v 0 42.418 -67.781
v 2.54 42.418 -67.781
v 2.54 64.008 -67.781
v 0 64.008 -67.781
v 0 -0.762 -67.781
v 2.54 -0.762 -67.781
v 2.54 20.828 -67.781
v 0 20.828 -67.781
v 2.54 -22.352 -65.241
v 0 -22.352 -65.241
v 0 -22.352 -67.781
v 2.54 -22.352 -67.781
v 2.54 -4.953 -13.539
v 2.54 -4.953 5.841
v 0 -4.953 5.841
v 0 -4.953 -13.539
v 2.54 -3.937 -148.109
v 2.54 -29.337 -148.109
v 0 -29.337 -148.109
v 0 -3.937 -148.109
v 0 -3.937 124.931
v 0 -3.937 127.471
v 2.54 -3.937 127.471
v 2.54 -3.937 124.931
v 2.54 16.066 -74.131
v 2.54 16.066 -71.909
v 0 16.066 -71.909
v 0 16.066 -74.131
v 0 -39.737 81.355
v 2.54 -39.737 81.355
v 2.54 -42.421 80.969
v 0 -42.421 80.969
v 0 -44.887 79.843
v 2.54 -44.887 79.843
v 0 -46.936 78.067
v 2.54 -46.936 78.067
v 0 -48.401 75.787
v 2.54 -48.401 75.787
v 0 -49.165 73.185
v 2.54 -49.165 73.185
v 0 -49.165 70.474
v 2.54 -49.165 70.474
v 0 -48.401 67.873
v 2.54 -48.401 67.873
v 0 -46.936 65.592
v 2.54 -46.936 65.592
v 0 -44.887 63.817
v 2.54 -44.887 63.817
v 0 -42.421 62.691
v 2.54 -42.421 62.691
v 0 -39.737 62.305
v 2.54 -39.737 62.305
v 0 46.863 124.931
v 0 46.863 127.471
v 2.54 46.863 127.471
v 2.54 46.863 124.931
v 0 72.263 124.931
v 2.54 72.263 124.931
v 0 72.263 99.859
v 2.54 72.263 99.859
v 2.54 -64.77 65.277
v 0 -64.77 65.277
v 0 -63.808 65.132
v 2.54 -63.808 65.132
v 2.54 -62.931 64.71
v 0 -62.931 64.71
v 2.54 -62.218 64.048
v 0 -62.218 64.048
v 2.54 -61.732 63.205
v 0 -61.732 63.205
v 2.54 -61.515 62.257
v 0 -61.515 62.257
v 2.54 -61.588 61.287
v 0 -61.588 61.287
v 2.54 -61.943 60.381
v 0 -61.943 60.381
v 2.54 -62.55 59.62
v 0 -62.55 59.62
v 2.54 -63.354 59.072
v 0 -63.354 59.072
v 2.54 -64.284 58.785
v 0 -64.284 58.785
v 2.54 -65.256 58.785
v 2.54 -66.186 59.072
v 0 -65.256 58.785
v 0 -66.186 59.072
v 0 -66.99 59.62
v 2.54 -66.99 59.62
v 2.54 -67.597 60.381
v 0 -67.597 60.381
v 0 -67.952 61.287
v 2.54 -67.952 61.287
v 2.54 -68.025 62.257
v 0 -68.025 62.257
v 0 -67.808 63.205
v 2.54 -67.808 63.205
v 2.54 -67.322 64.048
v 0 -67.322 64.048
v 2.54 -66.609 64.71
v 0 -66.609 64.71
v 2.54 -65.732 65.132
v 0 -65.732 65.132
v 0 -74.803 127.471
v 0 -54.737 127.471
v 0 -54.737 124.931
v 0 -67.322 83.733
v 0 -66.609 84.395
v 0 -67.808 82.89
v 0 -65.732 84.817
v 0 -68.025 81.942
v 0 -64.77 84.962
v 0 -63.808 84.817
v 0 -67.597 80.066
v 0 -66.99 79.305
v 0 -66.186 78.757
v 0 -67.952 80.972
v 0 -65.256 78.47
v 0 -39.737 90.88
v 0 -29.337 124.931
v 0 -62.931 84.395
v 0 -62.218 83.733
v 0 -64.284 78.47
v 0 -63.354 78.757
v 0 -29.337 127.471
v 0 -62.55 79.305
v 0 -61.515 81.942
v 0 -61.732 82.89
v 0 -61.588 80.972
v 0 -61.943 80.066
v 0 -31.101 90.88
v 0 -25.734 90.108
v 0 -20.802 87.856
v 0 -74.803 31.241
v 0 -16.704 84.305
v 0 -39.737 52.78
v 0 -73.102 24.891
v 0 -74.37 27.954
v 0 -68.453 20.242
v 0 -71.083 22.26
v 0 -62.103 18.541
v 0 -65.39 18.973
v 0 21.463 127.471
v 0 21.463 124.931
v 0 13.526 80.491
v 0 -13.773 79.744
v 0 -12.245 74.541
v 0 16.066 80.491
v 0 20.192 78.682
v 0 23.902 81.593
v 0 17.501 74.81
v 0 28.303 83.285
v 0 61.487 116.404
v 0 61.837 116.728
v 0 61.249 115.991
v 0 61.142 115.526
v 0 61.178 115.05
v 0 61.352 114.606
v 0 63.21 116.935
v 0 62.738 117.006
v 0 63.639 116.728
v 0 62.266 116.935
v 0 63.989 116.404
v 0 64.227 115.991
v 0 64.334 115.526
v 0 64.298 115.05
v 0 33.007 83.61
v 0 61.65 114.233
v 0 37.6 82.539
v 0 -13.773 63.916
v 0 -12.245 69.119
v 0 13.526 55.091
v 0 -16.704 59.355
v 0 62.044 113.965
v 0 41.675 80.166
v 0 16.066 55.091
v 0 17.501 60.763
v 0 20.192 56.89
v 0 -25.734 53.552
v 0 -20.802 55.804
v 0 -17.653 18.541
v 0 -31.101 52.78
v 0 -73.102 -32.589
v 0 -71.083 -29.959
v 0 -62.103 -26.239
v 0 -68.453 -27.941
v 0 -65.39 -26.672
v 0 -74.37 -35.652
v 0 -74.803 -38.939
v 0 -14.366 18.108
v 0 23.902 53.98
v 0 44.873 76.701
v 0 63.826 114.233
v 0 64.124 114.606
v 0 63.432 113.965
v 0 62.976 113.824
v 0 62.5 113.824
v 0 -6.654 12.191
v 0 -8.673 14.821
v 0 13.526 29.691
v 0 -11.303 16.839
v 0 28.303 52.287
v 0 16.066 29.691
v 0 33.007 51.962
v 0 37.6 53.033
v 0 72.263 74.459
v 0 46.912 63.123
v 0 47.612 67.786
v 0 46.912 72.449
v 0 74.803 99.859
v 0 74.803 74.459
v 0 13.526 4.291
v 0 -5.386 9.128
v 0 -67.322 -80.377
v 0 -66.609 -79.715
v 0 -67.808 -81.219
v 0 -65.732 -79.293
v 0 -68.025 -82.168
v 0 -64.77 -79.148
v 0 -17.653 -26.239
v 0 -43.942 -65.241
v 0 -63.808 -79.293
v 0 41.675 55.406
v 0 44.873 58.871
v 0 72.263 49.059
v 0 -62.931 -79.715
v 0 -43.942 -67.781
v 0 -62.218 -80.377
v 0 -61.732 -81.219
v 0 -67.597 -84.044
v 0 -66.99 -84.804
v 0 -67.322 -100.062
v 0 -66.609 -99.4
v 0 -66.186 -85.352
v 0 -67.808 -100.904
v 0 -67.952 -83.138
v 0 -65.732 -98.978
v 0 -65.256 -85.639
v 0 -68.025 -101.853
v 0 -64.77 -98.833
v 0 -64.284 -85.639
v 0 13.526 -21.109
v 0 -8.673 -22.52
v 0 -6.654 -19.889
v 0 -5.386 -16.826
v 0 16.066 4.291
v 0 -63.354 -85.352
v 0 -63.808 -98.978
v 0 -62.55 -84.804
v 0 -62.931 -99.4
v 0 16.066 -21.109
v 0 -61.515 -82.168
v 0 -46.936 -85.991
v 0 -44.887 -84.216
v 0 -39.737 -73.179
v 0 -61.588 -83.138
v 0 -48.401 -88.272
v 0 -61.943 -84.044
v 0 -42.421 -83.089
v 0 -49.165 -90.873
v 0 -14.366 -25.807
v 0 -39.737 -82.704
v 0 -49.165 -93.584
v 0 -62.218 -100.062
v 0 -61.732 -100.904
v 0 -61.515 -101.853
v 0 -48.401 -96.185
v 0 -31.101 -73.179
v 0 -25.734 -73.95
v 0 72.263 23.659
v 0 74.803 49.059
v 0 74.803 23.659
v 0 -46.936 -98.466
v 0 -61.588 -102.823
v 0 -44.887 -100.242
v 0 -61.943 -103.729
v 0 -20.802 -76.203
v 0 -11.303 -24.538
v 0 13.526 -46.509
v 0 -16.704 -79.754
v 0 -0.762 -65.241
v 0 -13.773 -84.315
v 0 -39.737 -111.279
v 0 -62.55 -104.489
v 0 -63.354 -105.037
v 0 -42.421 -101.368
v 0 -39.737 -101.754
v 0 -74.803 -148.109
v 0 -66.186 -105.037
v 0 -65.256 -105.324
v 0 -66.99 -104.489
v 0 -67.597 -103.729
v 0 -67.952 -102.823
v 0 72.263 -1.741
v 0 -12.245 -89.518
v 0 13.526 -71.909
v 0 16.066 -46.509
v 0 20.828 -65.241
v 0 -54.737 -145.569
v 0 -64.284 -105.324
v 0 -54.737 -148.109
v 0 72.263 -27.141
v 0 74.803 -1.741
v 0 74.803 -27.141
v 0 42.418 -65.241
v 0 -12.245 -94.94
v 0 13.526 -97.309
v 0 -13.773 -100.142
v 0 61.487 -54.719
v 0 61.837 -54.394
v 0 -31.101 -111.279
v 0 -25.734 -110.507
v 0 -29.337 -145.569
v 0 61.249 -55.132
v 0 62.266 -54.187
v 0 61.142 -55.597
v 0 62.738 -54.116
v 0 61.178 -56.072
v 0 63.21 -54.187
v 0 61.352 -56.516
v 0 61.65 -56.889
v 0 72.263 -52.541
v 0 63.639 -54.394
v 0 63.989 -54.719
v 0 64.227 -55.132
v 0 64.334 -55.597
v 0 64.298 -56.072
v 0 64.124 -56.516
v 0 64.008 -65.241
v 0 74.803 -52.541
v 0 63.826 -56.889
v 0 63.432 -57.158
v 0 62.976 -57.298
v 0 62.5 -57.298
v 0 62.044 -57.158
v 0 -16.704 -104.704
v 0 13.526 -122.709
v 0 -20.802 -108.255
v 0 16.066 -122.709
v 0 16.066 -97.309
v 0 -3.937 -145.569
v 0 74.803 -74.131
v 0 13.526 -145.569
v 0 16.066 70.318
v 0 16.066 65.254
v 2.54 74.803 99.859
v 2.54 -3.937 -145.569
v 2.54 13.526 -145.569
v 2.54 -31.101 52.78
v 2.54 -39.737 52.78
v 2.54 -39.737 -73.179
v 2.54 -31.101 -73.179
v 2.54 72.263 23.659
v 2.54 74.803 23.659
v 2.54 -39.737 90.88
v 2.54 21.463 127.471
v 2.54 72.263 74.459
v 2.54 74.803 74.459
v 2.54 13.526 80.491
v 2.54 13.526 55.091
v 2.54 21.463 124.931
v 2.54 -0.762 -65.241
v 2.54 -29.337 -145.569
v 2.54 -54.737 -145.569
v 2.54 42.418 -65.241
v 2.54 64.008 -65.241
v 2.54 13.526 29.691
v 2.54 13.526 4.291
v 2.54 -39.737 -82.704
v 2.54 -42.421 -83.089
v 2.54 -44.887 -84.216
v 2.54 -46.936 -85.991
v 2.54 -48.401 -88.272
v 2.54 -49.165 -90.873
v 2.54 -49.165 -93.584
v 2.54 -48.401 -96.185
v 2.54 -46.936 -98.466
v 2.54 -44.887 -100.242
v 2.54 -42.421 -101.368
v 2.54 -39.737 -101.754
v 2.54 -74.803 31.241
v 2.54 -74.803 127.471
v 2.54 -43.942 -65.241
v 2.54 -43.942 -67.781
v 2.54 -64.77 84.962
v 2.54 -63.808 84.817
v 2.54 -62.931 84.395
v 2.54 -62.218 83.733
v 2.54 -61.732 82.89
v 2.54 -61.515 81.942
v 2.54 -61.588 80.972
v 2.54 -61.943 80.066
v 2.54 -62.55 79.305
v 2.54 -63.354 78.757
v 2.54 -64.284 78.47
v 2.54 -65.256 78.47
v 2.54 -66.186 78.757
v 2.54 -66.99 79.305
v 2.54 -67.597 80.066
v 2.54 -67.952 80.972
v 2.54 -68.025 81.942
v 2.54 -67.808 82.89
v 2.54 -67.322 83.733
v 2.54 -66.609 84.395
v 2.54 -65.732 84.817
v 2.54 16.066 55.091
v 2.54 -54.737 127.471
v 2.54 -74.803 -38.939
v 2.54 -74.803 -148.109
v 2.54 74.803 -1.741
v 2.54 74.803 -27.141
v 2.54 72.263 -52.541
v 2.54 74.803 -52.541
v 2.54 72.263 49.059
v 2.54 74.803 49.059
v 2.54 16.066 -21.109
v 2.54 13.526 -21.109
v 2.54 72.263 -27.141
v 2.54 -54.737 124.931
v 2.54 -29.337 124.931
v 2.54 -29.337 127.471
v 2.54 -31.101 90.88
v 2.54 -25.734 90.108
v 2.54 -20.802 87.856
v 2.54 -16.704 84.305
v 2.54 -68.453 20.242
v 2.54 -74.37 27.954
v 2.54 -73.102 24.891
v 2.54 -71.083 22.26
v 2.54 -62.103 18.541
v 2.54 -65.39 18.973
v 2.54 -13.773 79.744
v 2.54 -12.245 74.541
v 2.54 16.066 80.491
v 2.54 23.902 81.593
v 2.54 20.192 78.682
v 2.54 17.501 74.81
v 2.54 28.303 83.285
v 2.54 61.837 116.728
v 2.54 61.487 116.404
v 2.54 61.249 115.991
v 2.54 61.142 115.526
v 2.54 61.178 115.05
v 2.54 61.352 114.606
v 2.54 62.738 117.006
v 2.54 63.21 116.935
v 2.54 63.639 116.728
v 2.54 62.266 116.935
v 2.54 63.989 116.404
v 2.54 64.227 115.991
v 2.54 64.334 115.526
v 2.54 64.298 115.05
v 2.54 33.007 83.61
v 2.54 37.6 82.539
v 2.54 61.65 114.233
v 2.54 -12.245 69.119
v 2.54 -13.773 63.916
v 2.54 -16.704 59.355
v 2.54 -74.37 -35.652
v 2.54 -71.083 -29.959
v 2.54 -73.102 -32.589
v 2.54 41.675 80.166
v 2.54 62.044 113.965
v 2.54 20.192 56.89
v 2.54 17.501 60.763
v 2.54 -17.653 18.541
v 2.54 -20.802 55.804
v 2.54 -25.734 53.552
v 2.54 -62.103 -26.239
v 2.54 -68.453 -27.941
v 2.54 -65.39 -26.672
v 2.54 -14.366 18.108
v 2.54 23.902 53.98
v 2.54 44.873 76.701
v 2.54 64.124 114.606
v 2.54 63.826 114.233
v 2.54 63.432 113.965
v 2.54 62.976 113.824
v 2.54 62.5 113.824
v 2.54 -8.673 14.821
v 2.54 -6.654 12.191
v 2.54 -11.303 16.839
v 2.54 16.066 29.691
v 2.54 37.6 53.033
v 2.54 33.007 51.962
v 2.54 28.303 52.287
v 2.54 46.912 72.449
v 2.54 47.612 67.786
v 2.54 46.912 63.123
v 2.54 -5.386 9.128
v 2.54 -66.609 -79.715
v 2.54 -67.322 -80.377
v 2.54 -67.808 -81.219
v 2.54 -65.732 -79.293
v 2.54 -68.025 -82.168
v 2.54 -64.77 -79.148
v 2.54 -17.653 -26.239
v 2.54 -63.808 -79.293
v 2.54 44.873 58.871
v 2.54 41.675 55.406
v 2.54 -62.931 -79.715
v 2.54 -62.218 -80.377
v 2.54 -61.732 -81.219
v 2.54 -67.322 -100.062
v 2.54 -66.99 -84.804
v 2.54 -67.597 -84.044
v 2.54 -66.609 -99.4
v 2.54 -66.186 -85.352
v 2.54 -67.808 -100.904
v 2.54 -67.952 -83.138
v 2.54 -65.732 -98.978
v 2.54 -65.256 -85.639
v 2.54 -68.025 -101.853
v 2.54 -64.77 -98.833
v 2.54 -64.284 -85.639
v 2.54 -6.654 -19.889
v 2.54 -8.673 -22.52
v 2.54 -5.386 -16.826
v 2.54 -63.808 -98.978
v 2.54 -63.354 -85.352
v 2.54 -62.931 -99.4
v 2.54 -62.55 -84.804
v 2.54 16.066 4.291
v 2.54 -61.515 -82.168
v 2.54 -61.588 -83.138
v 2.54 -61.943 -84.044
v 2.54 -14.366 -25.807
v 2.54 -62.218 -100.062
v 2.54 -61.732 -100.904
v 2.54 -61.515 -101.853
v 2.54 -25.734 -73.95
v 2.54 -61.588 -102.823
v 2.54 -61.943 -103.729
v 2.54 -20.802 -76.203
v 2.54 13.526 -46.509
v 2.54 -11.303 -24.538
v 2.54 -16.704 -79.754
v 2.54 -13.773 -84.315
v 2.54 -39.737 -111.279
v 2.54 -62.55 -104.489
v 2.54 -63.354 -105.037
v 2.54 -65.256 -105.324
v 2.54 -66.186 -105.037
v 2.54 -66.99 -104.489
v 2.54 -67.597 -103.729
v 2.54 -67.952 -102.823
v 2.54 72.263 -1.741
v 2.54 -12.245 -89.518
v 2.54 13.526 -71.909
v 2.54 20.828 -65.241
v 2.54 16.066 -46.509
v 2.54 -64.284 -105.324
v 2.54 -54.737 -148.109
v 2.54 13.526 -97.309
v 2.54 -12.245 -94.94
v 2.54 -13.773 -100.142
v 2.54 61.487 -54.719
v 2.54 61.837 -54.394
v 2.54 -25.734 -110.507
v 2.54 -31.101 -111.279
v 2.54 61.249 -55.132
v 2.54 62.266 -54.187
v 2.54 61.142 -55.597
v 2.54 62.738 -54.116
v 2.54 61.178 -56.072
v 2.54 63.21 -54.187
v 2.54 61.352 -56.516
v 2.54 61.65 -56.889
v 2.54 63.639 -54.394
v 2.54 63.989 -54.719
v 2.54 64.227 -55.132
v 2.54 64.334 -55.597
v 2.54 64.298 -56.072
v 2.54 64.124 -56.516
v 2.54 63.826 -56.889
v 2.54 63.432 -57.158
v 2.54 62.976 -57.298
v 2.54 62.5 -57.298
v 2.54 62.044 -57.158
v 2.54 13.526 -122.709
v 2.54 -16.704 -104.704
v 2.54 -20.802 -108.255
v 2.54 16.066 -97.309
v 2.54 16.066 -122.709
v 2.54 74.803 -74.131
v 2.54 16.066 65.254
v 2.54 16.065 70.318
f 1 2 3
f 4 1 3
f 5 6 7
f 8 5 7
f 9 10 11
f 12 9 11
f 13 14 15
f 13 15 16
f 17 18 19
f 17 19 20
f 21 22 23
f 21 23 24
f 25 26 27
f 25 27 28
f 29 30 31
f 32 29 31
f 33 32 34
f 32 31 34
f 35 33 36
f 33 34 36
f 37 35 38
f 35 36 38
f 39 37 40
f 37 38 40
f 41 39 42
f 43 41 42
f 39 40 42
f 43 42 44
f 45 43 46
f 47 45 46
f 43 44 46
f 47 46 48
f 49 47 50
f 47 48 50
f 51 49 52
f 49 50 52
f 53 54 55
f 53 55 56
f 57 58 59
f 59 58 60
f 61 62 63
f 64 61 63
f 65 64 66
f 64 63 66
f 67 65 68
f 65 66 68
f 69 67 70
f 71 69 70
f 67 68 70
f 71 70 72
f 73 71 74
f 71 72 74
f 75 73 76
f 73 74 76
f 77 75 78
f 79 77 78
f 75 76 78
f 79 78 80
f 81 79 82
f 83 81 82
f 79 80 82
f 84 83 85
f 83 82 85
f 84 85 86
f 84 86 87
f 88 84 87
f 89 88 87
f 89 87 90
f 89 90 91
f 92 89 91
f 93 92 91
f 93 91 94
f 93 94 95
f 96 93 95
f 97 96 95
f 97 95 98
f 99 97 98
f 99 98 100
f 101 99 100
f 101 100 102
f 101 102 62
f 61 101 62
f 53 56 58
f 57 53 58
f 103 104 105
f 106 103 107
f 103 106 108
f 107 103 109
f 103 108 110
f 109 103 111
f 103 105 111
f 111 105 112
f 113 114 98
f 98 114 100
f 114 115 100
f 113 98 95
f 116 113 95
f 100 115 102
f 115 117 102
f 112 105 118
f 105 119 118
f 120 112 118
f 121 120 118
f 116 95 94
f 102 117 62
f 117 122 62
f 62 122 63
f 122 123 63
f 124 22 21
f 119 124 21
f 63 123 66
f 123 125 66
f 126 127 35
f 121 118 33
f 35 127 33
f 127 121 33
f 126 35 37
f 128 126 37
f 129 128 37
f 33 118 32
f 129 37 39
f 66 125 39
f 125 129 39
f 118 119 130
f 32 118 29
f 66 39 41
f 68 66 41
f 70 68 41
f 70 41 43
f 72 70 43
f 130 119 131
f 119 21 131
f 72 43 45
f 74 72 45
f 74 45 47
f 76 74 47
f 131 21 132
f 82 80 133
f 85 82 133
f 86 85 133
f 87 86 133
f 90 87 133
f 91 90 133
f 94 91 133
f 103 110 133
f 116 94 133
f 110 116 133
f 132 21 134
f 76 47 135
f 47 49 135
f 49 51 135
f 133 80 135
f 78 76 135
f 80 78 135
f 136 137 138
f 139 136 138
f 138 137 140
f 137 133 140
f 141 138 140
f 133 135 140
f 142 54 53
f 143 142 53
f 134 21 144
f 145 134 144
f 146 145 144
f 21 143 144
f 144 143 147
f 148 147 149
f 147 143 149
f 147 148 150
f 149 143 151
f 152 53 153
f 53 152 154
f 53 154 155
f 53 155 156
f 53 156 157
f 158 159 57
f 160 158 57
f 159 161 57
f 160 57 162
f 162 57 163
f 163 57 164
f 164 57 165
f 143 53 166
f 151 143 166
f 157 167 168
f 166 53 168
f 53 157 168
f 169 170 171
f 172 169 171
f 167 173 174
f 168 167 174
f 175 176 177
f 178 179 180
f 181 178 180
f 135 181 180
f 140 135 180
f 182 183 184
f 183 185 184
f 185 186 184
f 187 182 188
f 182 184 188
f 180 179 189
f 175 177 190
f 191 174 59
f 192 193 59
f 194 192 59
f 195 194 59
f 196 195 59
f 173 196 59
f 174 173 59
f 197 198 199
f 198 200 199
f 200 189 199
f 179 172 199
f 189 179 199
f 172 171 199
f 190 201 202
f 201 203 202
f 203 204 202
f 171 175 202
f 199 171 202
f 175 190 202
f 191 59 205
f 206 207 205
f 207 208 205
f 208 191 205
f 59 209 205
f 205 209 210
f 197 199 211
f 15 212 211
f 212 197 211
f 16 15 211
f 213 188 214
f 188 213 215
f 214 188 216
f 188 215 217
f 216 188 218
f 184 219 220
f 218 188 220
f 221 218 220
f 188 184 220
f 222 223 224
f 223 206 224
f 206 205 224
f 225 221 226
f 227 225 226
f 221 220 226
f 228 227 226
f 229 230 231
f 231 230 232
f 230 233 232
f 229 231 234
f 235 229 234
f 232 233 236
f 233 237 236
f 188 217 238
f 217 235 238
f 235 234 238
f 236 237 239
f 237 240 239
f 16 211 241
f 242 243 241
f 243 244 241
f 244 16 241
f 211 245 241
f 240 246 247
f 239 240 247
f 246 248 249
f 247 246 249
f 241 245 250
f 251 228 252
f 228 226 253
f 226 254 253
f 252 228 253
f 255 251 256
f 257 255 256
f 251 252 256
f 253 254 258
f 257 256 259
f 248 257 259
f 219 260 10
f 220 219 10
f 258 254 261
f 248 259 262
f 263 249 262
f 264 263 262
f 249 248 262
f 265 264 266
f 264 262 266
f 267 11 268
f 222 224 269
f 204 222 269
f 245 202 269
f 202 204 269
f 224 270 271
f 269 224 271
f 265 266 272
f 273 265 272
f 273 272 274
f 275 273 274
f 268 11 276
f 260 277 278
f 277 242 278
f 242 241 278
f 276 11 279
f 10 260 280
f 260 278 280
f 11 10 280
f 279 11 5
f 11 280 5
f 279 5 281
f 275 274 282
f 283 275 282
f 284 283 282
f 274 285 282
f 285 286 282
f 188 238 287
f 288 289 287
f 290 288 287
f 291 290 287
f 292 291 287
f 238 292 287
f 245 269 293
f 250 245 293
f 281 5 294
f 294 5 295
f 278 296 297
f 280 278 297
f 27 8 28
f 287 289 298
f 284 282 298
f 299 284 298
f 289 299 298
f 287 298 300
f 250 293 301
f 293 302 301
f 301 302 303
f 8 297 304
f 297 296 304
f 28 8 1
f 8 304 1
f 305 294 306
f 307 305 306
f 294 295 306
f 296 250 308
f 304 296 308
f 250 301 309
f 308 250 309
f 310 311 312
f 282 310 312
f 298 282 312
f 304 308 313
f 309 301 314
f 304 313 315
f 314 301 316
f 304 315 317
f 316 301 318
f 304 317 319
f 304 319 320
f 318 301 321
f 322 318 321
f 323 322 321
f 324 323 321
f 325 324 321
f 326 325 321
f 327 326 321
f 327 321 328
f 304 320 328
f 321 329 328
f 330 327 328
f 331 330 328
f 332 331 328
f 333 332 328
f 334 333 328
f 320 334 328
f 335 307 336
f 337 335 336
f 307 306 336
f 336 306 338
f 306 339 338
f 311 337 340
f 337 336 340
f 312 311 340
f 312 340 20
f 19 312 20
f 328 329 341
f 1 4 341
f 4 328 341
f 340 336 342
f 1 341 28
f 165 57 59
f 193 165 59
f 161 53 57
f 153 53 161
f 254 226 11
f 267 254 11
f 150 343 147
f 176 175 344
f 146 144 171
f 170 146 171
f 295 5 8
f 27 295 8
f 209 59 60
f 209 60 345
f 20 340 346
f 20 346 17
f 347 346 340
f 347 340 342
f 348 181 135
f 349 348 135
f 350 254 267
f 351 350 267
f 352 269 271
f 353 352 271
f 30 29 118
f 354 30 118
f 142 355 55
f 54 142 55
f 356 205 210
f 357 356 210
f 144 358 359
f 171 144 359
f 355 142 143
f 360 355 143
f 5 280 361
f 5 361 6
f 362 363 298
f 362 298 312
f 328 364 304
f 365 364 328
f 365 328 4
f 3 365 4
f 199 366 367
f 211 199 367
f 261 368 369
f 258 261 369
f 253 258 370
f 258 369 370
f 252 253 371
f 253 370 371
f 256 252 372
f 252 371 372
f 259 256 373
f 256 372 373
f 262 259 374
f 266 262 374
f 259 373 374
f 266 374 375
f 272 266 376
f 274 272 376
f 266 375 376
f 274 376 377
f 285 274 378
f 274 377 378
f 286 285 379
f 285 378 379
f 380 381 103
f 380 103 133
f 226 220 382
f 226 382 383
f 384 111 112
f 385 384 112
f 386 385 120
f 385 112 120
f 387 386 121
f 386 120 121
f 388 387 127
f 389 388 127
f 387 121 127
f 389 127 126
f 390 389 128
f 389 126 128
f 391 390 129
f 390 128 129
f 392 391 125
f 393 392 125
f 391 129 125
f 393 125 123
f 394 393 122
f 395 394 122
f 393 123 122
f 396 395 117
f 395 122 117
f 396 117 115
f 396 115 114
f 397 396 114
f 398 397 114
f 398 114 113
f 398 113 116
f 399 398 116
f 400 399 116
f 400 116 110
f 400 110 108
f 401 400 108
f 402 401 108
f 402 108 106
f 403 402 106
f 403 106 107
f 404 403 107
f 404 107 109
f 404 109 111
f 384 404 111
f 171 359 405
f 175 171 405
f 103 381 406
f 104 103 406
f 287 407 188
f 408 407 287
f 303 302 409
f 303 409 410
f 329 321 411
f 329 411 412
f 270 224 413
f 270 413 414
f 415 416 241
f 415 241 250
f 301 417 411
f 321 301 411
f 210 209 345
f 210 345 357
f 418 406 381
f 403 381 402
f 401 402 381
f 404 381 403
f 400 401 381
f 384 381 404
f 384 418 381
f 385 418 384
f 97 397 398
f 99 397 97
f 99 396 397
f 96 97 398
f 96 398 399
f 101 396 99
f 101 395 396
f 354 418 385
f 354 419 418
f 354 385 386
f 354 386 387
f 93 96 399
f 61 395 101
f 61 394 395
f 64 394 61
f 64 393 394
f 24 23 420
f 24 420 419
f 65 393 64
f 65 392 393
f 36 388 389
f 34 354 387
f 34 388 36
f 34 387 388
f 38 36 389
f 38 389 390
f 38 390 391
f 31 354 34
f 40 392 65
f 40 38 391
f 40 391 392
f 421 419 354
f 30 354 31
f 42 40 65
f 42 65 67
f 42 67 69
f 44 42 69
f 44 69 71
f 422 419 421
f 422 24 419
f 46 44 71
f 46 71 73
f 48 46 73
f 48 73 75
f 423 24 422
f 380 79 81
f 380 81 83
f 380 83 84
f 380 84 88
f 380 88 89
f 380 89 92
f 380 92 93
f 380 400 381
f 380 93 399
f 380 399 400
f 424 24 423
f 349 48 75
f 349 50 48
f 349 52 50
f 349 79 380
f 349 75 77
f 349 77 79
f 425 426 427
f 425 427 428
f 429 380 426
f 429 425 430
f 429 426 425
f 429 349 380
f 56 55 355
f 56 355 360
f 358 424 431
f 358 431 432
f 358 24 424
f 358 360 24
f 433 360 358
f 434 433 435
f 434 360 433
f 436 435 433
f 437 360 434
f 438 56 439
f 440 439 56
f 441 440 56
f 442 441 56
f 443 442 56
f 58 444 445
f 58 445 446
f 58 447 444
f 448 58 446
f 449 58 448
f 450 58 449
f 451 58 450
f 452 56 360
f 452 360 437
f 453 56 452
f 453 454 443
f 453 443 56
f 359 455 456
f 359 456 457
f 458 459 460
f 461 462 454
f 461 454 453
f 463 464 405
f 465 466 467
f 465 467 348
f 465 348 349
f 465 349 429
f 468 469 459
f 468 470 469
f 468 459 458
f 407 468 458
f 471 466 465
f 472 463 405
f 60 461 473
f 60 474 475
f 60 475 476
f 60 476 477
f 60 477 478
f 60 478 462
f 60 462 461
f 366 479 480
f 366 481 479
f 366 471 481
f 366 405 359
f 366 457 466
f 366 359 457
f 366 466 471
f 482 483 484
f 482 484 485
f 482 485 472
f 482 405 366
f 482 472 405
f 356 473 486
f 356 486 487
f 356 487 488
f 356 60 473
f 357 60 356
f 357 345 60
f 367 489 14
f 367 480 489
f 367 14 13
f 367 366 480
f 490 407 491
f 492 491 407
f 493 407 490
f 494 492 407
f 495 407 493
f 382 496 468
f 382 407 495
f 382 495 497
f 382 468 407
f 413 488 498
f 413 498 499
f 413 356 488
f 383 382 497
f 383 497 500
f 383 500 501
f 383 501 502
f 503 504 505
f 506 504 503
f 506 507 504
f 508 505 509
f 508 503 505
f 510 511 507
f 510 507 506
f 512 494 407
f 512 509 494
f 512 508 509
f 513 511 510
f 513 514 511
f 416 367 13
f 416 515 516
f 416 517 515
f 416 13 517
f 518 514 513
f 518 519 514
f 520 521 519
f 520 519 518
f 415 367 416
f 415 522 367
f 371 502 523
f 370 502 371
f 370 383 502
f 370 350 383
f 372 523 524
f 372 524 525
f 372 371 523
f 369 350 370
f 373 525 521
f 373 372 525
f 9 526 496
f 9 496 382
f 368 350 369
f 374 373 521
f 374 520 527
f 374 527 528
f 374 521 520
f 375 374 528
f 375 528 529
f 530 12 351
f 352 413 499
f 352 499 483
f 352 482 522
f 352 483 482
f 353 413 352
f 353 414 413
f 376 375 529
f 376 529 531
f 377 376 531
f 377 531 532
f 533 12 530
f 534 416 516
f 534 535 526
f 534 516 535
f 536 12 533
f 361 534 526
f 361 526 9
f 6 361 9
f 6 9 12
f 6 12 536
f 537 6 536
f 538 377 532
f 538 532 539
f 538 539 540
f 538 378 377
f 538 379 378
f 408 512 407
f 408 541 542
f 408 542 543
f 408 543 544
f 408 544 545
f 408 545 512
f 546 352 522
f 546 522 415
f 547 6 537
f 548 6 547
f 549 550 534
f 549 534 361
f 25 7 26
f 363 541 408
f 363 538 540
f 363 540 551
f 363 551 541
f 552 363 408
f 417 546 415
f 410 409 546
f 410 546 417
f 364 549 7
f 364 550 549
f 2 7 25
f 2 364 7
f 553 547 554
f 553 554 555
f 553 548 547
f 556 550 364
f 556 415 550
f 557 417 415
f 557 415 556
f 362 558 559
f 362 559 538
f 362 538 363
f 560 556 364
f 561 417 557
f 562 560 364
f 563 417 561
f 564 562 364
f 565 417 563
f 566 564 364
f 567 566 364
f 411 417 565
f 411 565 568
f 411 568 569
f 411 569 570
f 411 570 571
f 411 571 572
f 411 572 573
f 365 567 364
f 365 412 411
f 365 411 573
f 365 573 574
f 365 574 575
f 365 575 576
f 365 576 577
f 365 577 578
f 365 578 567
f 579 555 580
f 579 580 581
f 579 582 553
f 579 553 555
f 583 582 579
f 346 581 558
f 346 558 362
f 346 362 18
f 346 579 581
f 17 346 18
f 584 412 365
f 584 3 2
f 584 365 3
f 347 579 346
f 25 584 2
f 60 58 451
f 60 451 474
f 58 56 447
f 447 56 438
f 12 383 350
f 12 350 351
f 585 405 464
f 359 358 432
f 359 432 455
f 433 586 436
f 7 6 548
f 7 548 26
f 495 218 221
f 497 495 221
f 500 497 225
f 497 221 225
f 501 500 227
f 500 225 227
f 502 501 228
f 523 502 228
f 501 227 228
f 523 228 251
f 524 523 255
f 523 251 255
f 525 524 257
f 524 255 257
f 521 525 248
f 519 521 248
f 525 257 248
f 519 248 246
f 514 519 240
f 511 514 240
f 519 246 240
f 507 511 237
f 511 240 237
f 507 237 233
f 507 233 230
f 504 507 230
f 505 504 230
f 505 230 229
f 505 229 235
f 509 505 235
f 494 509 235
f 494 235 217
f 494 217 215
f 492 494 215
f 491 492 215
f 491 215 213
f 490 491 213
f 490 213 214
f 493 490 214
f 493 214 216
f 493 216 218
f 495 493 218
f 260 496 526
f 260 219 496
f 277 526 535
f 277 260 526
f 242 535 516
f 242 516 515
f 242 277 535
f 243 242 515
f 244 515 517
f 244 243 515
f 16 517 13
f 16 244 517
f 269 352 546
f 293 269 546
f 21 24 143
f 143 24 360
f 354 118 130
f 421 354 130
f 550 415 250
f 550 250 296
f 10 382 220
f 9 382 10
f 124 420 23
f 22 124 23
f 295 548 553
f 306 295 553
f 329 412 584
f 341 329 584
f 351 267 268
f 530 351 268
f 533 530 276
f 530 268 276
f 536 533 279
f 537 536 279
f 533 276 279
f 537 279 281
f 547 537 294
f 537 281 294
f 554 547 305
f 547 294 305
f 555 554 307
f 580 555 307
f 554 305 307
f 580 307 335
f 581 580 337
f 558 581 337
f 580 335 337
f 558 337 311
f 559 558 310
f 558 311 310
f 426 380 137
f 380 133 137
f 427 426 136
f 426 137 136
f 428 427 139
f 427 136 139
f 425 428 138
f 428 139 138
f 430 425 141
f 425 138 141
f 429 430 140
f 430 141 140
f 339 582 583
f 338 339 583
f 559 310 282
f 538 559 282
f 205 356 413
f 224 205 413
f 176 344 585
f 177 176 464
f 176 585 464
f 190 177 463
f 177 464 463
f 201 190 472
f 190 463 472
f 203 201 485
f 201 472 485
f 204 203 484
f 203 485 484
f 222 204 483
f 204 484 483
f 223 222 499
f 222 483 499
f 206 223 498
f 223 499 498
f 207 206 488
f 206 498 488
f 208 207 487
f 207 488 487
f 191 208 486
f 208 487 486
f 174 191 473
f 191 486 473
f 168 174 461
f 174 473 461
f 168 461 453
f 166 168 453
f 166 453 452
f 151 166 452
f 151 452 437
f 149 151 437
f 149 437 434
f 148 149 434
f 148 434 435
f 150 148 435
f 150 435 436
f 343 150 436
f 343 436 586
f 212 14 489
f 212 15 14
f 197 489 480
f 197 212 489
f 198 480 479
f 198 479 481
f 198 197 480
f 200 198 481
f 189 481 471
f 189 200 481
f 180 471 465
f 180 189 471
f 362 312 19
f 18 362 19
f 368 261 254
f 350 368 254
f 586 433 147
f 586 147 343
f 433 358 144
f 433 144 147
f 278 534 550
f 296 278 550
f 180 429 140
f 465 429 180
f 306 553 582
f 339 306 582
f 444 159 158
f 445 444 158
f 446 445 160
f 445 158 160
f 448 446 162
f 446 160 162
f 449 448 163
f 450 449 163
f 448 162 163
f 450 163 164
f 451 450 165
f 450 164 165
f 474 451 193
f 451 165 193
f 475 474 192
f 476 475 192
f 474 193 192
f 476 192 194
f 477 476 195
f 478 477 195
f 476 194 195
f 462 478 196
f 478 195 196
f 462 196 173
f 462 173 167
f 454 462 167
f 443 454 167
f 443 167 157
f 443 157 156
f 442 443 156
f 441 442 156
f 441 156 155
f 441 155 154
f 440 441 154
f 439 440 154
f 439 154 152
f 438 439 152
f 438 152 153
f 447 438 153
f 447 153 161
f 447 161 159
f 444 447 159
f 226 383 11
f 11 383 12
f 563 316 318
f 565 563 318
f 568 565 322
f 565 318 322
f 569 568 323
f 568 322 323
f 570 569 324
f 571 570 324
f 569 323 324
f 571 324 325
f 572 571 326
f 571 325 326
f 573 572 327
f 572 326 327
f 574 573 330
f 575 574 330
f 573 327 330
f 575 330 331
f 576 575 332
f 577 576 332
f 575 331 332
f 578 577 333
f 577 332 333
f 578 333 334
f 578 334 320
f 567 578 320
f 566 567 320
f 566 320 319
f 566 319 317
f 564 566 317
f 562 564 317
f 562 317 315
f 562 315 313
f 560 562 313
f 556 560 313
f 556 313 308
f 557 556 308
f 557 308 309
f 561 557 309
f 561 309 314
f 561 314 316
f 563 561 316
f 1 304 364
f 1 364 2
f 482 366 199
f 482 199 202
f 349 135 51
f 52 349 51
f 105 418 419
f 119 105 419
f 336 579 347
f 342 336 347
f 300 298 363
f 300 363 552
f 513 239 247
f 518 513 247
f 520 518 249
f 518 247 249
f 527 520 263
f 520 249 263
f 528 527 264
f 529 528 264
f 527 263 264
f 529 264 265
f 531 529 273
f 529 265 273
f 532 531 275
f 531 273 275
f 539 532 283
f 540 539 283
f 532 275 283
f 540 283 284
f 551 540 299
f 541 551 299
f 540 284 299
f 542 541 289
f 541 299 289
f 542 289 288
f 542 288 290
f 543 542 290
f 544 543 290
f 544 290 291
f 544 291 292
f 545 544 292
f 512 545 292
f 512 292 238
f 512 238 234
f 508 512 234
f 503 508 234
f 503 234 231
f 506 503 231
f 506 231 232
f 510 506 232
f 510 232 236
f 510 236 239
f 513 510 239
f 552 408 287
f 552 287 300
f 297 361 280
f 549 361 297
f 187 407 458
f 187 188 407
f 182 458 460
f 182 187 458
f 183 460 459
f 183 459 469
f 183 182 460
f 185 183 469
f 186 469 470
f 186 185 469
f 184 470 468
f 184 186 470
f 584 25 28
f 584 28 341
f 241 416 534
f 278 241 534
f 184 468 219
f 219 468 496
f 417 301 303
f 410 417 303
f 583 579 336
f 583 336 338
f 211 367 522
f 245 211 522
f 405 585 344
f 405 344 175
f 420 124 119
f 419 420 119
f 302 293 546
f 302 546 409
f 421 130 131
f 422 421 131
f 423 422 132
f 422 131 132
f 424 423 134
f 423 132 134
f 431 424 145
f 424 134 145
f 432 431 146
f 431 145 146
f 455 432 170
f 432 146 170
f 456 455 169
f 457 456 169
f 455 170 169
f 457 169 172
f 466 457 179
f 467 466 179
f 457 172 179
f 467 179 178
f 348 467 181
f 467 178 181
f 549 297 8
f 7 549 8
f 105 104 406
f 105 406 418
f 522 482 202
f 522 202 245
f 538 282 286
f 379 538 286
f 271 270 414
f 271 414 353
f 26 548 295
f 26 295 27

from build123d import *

# Parameters (mm, degrees)
SKETCH1_W                   = 224.46234
SKETCH1_H                   = 149.606
BOSS_EXTRUDE1_DEPTH         = 2.54
SKETCH2_W                   = 44.45
SKETCH2_H                   = 87.5411
CUT_EXTRUDE1_DEPTH          = 135.899132423
F_1_4_CLEARANCE_HOLE1_D     = 6.5278
F_1_4_CLEARANCE_HOLE1_DEPTH = 9.398
F_1_4_CLEARANCE_HOLE1_TIP   = 1.961148974
SKETCH6_W                   = 25.4
SKETCH6_H                   = 2.54
CUT_EXTRUDE2_DEPTH          = 135.899132423
LPATTERN1_COUNT             = 4
LPATTERN1_PITCH             = 50.8
SKETCH7_W                   = 2.54
SKETCH7_H                   = 21.59
CUT_EXTRUDE3_DEPTH          = 135.899132423
LPATTERN2_COUNT             = 3
LPATTERN2_PITCH             = 43.18
SKETCH8_R                   = 9.525
CUT_EXTRUDE4_DEPTH          = 135.899132423
SKETCH9_R                   = 15.875
SKETCH9_W                   = 44.7802
SKETCH9_H                   = 69.85
CUT_EXTRUDE5_DEPTH          = 135.899132423
FILLET2_R                   = 12.7
SKETCH25_W                  = 12.7
SKETCH25_H                  = 147.066
BOSS_EXTRUDE5_DEPTH         = 2.54
SKETCH16_W                  = 2.54
SKETCH16_H                  = 25.4
BOSS_EXTRUDE2_DEPTH         = 2.54
SKETCH23_W                  = 44.45
SKETCH23_H                  = 87.5411
BOSS_EXTRUDE3_DEPTH         = 2.54
SKETCH24_W                  = 33.3375
SKETCH24_H                  = 149.606
BOSS_EXTRUDE4_DEPTH         = 2.54
LPATTERN3_COUNT             = 3
LPATTERN3_PITCH             = 50.8
LPATTERN3_COUNT_DIR2        = 2
LPATTERN3_PITCH_DIR2        = 273.03984
SKETCH18_W                  = 275.57984
SKETCH18_H                  = 5.334
CUT_EXTRUDE7_DEPTH          = 169.417839014
M3_CLEARANCE_HOLE1_D        = 3.2
M3_CLEARANCE_HOLE1_DEPTH    = 9.398
M3_CLEARANCE_HOLE1_TIP      = 0.96137699
SKETCH27_W                  = 73.9775
SKETCH27_H                  = 58.7375
CUT_EXTRUDE9_DEPTH          = 2.54
CUT_EXTRUDE10_DEPTH         = 2.54
SKETCH29_W                  = 25.4
SKETCH29_H                  = 2.54
CUT_EXTRUDE11_DEPTH         = 166.946131435
LPATTERN4_COUNT             = 5
LPATTERN4_PITCH             = 50.8


with BuildPart() as part:
    # Sketch1 → Boss-Extrude1 (new body)
    with BuildSketch(Plane(origin=(0, 0, 0), x_dir=(0, 0, -1), z_dir=(1, 0, 0))):
        Rectangle(SKETCH1_W, SKETCH1_H)
    extrude(amount=BOSS_EXTRUDE1_DEPTH)

    # Sketch2 → Cut-Extrude1 (cut, through all)
    with BuildSketch(Plane(origin=(2.54, 0, 0), x_dir=(0, 0, -1), z_dir=(1, 0, 0))):
        with Locations((90.00617, 31.03245)):
            Rectangle(SKETCH2_W, SKETCH2_H)
    extrude(amount=-CUT_EXTRUDE1_DEPTH, mode=Mode.SUBTRACT)

    # 1/4 Clearance Hole1
    with Locations(Plane(origin=(2.54, 0, 0), x_dir=(0, 0, -1), z_dir=(1, 0, 0))):
        with Locations((-81.69783, -64.77), (-62.01283, -64.77), (102.09657, -64.77), (82.41157, -64.77)):
            Hole(F_1_4_CLEARANCE_HOLE1_D / 2, depth=F_1_4_CLEARANCE_HOLE1_DEPTH)
            with Locations((0, 0, -(F_1_4_CLEARANCE_HOLE1_DEPTH + F_1_4_CLEARANCE_HOLE1_TIP / 2))):  # 118° drill point
                Cone(0, F_1_4_CLEARANCE_HOLE1_D / 2, F_1_4_CLEARANCE_HOLE1_TIP, mode=Mode.SUBTRACT)

    # Sketch6 → Cut-Extrude2 (cut, through all)
    with BuildSketch(Plane(origin=(2.54, 0, 0), x_dir=(0, 0, -1), z_dir=(1, 0, 0))):
        with Locations((39.84117, 73.533)):
            Rectangle(SKETCH6_W, SKETCH6_H)
    cut_extrude2 = extrude(amount=-CUT_EXTRUDE2_DEPTH, mode=Mode.SUBTRACT)

    # LPattern1: Cut-Extrude2 ×4
    with Locations(*[(0, 0, i * LPATTERN1_PITCH) for i in range(1, LPATTERN1_COUNT)]):
        add(cut_extrude2, mode=Mode.SUBTRACT)

    # Sketch7 → Cut-Extrude3 (cut, through all)
    with BuildSketch(Plane(origin=(2.54, 0, 0), x_dir=(0, 0, -1), z_dir=(1, 0, 0))):
        with Locations((66.51117, 53.213)):
            Rectangle(SKETCH7_W, SKETCH7_H)
    cut_extrude3 = extrude(amount=-CUT_EXTRUDE3_DEPTH, mode=Mode.SUBTRACT)

    # LPattern2: Cut-Extrude3 ×3
    with Locations(*[(0, -i * LPATTERN2_PITCH, 0) for i in range(1, LPATTERN2_COUNT)]):
        add(cut_extrude3, mode=Mode.SUBTRACT)

    # Sketch8 → Cut-Extrude4 (cut, through all)
    with BuildSketch(Plane(origin=(2.54, 0, 0), x_dir=(0, 0, -1), z_dir=(1, 0, 0))):
        with Locations((92.22867, -39.7370046)):
            Circle(SKETCH8_R)
        with Locations((-71.82993, -39.7370046)):
            Circle(SKETCH8_R)
    extrude(amount=-CUT_EXTRUDE4_DEPTH, mode=Mode.SUBTRACT)

    # Sketch9 → Cut-Extrude5 (cut, through all)
    with BuildSketch(Plane(origin=(2.54, 0, 0), x_dir=(0, 0, -1), z_dir=(1, 0, 0))):
        with Locations((-67.78625, 31.7373)):
            Circle(SKETCH9_R)
        with Locations((3.84937, -39.878)):
            Rectangle(SKETCH9_W, SKETCH9_H)
    extrude(amount=-CUT_EXTRUDE5_DEPTH, mode=Mode.SUBTRACT)

    # Fillet2
    fillet2_edges = [part.edges().sort_by_distance(p)[0] for p in [
        (1.27, -74.803, 18.54073),
        (1.27, -4.953, 18.54073),
        (1.27, -4.953, -26.23947),
        (1.27, -74.803, -26.23947),
    ]]
    fillet(fillet2_edges, radius=FILLET2_R)

    # Sketch25 → Boss-Extrude5 (add)
    with BuildSketch(Plane(origin=(2.54, 0, 0), x_dir=(0, 0, -1), z_dir=(1, 0, 0))):
        with Locations((-118.58117, -1.27)):
            Rectangle(SKETCH25_W, SKETCH25_H)
    extrude(amount=-BOSS_EXTRUDE5_DEPTH)

    # Sketch16 → Boss-Extrude2 (add)
    with BuildSketch(Plane(origin=(2.54, 0, 0), x_dir=(0, 0, -1), z_dir=(1, 0, 0))):
        with Locations((-126.20117, 34.163)):
            Rectangle(SKETCH16_W, SKETCH16_H)
    boss_extrude2 = extrude(amount=-BOSS_EXTRUDE2_DEPTH)

    # Sketch23 → Boss-Extrude3 (add)
    with BuildSketch(Plane(origin=(2.54, 0, 0), x_dir=(0, 0, -1), z_dir=(1, 0, 0))):
        with Locations((90.00617, 31.03245)):
            Rectangle(SKETCH23_W, SKETCH23_H)
    extrude(amount=-BOSS_EXTRUDE3_DEPTH)

    # Sketch24 → Boss-Extrude4 (add)
    with BuildSketch(Plane(origin=(2.54, 0, 0), x_dir=(0, 0, -1), z_dir=(1, 0, 0))):
        with Locations((128.89992, 0)):
            Rectangle(SKETCH24_W, SKETCH24_H)
    extrude(amount=-BOSS_EXTRUDE4_DEPTH)

    # LPattern3: Boss-Extrude2 3 × 2
    with Locations(*[(0, -i * LPATTERN3_PITCH, -j * LPATTERN3_PITCH_DIR2) for i in range(LPATTERN3_COUNT) for j in range(LPATTERN3_COUNT_DIR2) if (i, j) != (0, 0)]):
        add(boss_extrude2)

    # Sketch18 → Cut-Extrude7 (cut, through all)
    with BuildSketch(Plane(origin=(2.54, 0, 0), x_dir=(0, 0, -1), z_dir=(1, 0, 0))):
        with Locations((10.31875, -77.47)):
            Rectangle(SKETCH18_W, SKETCH18_H)
    extrude(amount=-CUT_EXTRUDE7_DEPTH, mode=Mode.SUBTRACT)

    # M3 Clearance Hole1
    with Locations(Plane(origin=(2.54, 0, 0), x_dir=(0, 0, -1), z_dir=(1, 0, 0))):
        with Locations((-115.40617, 62.738), (55.71617, 62.738)):
            Hole(M3_CLEARANCE_HOLE1_D / 2, depth=M3_CLEARANCE_HOLE1_DEPTH)
            with Locations((0, 0, -(M3_CLEARANCE_HOLE1_DEPTH + M3_CLEARANCE_HOLE1_TIP / 2))):  # 118° drill point
                Cone(0, M3_CLEARANCE_HOLE1_D / 2, M3_CLEARANCE_HOLE1_TIP, mode=Mode.SUBTRACT)

    # Sketch27 → Cut-Extrude9 (cut)
    with BuildSketch(Plane(origin=(2.54, 0, 0), x_dir=(0, 0, -1), z_dir=(1, 0, 0))):
        with Locations((111.11992, 45.43425)):
            Rectangle(SKETCH27_W, SKETCH27_H)
    extrude(amount=-CUT_EXTRUDE9_DEPTH, mode=Mode.SUBTRACT)

    # Sketch28 → Cut-Extrude10 (cut)
    with BuildSketch(Plane.ZY):
        with BuildLine():
            Line((-111.27867, -31.1010046), (-111.27867, -39.7370046))
            Line((-111.27867, -39.7370046), (-73.17867, -39.7370046))
            Line((-73.17867, -39.7370046), (-73.17867, -31.1010046))
            ThreePointArc((-73.17867, -31.1010046), (-92.22867, -12.0510046), (-111.27867, -31.1010046))
        make_face()
        with BuildLine():
            Line((52.77993, -31.1010046), (52.77993, -39.7370046))
            Line((52.77993, -39.7370046), (90.87993, -39.7370046))
            Line((90.87993, -39.7370046), (90.87993, -31.1010046))
            ThreePointArc((90.87993, -31.1010046), (71.82993, -12.0510046), (52.77993, -31.1010046))
        make_face()
    extrude(amount=-CUT_EXTRUDE10_DEPTH, mode=Mode.SUBTRACT)

    # Sketch29 → Cut-Extrude11 (cut, through all)
    with BuildSketch(Plane(origin=(2.54, 0, 0), x_dir=(0, 0, -1), z_dir=(1, 0, 0))):
        with Locations((135.40867, 14.7955)):
            Rectangle(SKETCH29_W, SKETCH29_H)
    cut_extrude11 = extrude(amount=-CUT_EXTRUDE11_DEPTH, mode=Mode.SUBTRACT)

    # LPattern4: Cut-Extrude11 ×5
    with Locations(*[(0, 0, i * LPATTERN4_PITCH) for i in range(1, LPATTERN4_COUNT)]):
        add(cut_extrude11, mode=Mode.SUBTRACT)


solid = part.part
